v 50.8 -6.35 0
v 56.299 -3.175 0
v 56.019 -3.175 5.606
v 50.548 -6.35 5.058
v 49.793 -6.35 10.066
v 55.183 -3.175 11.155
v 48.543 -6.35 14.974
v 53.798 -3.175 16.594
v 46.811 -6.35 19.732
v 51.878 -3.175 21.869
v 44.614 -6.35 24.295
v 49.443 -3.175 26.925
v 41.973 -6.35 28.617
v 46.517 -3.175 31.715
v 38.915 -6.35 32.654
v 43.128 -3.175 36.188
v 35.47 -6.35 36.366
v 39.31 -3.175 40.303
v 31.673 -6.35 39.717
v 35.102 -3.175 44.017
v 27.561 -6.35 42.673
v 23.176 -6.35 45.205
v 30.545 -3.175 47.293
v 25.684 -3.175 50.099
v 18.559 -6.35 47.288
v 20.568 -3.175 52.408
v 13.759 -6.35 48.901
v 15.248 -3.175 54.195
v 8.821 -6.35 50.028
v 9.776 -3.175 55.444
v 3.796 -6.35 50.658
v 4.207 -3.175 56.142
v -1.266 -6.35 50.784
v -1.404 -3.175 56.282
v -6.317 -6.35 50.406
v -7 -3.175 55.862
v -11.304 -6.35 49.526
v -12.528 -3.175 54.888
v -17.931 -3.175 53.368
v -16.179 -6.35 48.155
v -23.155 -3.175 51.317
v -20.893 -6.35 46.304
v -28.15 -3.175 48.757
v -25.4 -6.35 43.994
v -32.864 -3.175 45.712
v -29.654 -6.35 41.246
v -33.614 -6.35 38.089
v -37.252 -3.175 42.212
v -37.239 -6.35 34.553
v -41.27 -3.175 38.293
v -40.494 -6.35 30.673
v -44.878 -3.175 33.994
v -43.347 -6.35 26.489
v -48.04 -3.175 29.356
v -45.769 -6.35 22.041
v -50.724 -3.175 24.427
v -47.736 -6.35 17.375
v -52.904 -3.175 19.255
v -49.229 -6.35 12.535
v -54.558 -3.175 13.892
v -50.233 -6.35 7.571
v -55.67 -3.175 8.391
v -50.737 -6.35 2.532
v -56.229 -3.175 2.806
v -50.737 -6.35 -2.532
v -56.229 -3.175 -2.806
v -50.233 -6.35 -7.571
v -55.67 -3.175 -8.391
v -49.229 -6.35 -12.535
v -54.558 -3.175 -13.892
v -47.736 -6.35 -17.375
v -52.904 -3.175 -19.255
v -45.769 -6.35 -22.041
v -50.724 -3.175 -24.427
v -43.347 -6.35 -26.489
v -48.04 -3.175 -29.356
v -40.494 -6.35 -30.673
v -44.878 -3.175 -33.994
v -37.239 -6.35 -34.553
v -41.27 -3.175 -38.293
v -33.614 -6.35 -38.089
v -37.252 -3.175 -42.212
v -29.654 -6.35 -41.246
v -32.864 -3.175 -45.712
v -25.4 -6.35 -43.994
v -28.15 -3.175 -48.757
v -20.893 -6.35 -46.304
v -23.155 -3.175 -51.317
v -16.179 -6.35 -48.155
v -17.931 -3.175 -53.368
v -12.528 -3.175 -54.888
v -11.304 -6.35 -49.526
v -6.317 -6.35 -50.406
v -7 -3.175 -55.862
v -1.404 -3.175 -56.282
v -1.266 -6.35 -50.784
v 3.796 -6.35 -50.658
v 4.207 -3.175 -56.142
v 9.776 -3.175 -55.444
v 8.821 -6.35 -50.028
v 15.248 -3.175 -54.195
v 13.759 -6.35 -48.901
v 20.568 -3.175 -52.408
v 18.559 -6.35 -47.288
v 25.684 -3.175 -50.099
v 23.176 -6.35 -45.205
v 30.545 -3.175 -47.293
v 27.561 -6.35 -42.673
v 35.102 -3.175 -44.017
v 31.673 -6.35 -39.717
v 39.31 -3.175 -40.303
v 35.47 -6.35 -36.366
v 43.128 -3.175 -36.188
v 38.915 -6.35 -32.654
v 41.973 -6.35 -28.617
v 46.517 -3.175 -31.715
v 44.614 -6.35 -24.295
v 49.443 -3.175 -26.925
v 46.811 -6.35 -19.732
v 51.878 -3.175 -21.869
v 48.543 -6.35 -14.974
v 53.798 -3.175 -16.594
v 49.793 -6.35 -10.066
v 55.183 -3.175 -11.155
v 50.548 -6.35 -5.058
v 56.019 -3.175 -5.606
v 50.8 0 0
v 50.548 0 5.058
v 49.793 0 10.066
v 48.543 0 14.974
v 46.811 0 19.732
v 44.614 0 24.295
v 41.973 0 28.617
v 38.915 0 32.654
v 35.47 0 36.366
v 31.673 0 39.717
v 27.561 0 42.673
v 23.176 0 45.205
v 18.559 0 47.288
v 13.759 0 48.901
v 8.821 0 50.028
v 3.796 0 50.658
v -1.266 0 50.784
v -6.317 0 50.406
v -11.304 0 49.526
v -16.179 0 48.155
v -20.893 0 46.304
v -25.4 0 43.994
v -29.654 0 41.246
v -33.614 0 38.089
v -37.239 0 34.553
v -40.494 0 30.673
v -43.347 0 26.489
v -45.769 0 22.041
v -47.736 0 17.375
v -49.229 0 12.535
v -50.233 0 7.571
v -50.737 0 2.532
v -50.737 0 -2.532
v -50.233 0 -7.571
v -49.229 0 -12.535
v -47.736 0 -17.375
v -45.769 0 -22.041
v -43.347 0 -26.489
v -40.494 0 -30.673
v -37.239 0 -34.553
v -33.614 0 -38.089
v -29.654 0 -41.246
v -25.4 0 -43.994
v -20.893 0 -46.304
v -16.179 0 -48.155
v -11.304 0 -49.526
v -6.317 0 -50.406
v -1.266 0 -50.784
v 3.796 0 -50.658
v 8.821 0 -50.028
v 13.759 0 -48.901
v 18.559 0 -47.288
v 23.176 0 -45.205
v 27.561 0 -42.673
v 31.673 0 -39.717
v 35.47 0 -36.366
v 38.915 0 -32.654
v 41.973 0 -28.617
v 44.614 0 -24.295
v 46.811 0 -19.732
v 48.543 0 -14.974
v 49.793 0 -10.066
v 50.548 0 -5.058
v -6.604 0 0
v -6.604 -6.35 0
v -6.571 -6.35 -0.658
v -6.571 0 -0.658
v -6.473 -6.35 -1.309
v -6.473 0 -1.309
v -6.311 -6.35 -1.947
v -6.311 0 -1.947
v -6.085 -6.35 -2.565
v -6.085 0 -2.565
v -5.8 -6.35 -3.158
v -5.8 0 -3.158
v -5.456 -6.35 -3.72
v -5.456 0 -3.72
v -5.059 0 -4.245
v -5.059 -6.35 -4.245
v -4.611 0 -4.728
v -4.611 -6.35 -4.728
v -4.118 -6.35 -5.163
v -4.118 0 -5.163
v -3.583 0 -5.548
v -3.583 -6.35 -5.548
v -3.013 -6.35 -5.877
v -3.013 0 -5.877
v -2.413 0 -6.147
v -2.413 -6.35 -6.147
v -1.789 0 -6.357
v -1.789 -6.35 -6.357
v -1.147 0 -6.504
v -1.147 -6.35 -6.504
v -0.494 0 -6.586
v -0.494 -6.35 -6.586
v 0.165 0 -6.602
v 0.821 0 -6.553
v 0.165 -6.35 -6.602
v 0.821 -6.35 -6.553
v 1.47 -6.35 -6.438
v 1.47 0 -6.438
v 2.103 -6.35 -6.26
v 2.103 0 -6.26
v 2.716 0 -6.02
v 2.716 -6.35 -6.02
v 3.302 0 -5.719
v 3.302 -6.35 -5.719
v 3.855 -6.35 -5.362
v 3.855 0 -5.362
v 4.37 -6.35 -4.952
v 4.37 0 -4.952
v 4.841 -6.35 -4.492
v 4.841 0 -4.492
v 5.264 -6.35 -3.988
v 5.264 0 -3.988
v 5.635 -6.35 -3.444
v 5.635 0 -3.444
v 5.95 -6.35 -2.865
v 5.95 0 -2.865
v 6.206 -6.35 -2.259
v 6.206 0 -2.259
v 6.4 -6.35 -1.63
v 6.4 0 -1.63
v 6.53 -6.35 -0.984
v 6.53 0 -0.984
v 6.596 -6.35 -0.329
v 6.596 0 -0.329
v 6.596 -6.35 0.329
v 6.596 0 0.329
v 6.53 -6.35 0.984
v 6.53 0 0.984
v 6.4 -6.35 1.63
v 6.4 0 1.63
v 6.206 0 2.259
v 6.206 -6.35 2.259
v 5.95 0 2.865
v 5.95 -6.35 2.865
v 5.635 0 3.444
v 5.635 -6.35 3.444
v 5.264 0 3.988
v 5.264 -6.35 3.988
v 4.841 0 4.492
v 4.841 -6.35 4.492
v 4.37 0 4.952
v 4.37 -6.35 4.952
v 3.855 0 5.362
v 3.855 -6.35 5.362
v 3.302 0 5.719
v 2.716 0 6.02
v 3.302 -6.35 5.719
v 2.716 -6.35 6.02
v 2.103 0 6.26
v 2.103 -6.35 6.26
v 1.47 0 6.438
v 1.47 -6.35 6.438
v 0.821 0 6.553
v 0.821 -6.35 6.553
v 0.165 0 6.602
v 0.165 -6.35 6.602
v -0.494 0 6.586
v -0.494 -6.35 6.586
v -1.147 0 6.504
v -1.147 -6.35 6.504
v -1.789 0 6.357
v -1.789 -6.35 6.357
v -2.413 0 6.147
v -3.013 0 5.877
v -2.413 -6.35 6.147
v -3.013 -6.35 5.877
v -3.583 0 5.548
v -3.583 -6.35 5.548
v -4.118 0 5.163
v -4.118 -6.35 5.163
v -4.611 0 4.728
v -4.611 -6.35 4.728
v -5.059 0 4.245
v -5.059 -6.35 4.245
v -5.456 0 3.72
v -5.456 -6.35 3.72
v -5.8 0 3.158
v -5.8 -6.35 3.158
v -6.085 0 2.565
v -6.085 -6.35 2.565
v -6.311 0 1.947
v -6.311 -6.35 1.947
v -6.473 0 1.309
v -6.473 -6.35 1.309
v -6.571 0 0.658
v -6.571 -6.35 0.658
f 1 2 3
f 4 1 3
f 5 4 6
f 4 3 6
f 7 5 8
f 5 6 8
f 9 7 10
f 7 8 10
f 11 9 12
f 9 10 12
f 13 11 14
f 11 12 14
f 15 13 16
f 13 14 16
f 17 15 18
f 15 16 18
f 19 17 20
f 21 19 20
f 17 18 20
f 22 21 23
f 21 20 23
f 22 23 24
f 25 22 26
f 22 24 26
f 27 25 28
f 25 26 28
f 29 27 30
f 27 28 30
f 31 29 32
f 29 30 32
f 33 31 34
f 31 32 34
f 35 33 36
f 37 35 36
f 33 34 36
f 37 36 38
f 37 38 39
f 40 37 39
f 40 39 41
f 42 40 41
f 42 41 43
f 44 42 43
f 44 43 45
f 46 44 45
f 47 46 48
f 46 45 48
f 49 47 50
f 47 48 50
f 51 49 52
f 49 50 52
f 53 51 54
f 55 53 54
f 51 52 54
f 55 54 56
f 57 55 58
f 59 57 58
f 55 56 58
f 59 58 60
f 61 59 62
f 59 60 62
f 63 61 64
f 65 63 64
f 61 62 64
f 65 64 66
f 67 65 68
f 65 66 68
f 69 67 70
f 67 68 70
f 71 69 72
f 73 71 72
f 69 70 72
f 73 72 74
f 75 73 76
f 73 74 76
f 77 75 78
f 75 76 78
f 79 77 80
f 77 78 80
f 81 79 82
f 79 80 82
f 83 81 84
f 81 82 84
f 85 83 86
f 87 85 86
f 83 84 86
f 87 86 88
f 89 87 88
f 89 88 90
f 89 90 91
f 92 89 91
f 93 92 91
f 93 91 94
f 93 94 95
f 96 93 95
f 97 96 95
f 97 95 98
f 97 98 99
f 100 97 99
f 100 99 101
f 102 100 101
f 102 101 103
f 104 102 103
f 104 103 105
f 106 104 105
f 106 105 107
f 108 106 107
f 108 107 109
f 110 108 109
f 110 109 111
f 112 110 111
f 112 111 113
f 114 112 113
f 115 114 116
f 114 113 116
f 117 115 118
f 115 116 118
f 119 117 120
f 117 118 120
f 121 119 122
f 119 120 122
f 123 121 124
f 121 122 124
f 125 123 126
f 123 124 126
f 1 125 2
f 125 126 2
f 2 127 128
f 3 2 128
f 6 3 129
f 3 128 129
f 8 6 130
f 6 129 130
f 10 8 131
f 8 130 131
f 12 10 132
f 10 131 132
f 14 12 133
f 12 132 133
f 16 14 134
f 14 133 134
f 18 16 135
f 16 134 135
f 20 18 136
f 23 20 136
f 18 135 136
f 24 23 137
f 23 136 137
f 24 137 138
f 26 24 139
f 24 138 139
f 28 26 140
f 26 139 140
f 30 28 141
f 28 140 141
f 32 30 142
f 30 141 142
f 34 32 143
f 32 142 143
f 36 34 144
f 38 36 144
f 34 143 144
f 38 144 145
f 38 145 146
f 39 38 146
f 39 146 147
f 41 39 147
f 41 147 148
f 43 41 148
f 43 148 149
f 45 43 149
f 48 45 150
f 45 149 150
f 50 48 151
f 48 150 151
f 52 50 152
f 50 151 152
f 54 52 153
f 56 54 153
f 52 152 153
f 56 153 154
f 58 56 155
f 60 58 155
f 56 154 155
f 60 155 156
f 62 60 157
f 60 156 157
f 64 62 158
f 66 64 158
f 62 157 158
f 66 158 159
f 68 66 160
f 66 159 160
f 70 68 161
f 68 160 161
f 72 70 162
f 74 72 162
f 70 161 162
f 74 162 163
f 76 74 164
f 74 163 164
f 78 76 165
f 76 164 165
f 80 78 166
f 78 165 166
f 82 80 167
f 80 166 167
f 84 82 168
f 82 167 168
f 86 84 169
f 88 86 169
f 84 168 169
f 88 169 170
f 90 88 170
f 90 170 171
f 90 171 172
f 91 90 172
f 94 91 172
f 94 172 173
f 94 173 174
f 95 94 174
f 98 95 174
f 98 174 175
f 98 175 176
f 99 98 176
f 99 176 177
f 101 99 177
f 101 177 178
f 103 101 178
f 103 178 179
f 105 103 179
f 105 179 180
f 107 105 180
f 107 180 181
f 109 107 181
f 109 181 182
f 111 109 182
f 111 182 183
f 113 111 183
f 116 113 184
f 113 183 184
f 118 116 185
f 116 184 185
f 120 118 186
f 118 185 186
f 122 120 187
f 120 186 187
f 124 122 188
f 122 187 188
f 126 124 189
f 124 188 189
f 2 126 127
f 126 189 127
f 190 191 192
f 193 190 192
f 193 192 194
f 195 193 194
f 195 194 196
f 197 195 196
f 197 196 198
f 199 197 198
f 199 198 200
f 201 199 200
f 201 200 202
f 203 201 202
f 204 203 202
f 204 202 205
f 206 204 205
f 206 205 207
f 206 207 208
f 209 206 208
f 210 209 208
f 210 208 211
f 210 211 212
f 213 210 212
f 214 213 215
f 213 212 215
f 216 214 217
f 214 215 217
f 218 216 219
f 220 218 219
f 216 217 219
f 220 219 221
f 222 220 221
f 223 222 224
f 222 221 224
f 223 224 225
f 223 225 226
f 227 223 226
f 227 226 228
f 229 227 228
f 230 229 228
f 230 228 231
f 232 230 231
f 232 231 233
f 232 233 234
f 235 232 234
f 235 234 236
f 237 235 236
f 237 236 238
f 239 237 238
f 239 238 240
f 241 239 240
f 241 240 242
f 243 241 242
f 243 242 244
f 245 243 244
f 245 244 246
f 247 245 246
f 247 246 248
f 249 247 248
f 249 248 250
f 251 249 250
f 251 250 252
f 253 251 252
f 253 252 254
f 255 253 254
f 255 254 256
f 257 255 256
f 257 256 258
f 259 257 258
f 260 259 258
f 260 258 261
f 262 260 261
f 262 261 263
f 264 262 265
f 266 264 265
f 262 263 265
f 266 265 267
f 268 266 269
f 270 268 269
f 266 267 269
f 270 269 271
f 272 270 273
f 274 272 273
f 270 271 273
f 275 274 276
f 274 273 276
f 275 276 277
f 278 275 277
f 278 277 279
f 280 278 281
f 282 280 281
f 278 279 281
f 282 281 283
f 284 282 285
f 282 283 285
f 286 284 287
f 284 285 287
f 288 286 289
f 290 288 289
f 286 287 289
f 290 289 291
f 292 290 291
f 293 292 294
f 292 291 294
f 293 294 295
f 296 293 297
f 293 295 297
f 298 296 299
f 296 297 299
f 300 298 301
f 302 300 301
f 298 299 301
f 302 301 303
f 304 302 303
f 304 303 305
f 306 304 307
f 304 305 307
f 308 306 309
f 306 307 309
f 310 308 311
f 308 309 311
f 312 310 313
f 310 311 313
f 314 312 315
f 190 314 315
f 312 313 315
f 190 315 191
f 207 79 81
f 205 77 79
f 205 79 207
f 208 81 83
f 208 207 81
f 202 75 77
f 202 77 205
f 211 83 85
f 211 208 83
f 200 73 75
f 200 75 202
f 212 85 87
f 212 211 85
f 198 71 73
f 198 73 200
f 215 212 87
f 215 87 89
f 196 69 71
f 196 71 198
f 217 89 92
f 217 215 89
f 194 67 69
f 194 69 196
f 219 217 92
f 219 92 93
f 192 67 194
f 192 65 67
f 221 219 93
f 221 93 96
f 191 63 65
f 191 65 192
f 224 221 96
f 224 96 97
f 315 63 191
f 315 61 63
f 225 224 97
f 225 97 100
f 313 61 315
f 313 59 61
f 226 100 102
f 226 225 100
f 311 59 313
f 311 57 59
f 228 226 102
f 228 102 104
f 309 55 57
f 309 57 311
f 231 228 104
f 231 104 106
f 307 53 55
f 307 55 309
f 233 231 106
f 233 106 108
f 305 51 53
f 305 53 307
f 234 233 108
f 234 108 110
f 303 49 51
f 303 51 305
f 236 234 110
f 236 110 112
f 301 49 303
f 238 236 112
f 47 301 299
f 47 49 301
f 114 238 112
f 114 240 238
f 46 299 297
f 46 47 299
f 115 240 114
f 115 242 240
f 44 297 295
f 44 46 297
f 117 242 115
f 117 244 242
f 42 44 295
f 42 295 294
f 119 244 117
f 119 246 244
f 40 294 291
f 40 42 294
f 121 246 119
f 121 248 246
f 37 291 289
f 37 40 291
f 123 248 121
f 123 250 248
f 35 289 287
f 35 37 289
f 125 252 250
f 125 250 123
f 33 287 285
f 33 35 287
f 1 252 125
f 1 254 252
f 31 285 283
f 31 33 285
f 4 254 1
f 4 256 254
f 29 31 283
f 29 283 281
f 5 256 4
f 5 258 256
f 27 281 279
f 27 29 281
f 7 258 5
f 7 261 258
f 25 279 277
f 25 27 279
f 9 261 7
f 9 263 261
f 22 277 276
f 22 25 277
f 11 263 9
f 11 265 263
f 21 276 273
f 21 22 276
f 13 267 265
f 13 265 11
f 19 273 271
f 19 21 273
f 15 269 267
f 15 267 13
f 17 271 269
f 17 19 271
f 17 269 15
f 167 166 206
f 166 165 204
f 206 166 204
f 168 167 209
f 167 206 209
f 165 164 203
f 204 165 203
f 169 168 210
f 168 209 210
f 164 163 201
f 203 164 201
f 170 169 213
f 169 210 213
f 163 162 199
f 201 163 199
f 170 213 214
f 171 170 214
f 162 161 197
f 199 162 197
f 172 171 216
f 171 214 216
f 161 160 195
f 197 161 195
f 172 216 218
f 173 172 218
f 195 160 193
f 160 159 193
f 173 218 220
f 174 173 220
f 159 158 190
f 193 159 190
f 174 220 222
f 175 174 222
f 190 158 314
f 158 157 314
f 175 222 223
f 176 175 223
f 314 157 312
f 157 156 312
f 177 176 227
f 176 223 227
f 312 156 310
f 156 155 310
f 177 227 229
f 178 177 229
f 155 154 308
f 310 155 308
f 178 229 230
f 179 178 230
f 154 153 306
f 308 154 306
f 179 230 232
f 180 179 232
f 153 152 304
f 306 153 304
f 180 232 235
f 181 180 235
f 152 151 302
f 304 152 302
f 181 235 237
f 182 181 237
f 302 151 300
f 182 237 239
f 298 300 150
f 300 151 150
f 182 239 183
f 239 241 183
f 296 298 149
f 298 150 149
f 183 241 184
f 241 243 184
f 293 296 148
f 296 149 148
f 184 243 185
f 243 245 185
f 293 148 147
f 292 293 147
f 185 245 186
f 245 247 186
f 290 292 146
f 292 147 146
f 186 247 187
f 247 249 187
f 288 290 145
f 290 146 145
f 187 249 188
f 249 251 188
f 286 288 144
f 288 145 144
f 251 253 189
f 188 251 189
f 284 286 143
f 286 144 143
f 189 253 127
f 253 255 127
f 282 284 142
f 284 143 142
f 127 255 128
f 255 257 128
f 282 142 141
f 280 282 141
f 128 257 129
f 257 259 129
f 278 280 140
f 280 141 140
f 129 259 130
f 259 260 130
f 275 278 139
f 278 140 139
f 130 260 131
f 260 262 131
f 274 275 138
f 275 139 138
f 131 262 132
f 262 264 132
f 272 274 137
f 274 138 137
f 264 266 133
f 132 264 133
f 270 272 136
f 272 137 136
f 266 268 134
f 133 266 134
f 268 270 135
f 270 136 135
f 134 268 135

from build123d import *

# Parameters (mm, degrees)
F0_R     = 50.8
F1_DEPTH = 6.35
F2_D     = 13.208


with BuildPart() as f1:
    # F0 (on Front) → F1 (new body)
    with BuildSketch(Plane.XZ):
        Circle(F0_R)
    extrude(amount=F1_DEPTH)

    # F2 (through all)
    with Locations(Plane(origin=(0, 0, 0), x_dir=(1, 0, 0), z_dir=(0, 1, 0))):
        with Locations((0, 0)):
            Hole(F2_D / 2)

    # F3 (on Top) → F4 (revolve)
    with BuildSketch(Plane.XY):
        Polygon((50.8, 0), (50.8, -6.35), (56.299261, -3.175), align=None)
    revolve(axis=Axis((0, -6.35, 0), (0, -1, 0)))


solid = f1.part
